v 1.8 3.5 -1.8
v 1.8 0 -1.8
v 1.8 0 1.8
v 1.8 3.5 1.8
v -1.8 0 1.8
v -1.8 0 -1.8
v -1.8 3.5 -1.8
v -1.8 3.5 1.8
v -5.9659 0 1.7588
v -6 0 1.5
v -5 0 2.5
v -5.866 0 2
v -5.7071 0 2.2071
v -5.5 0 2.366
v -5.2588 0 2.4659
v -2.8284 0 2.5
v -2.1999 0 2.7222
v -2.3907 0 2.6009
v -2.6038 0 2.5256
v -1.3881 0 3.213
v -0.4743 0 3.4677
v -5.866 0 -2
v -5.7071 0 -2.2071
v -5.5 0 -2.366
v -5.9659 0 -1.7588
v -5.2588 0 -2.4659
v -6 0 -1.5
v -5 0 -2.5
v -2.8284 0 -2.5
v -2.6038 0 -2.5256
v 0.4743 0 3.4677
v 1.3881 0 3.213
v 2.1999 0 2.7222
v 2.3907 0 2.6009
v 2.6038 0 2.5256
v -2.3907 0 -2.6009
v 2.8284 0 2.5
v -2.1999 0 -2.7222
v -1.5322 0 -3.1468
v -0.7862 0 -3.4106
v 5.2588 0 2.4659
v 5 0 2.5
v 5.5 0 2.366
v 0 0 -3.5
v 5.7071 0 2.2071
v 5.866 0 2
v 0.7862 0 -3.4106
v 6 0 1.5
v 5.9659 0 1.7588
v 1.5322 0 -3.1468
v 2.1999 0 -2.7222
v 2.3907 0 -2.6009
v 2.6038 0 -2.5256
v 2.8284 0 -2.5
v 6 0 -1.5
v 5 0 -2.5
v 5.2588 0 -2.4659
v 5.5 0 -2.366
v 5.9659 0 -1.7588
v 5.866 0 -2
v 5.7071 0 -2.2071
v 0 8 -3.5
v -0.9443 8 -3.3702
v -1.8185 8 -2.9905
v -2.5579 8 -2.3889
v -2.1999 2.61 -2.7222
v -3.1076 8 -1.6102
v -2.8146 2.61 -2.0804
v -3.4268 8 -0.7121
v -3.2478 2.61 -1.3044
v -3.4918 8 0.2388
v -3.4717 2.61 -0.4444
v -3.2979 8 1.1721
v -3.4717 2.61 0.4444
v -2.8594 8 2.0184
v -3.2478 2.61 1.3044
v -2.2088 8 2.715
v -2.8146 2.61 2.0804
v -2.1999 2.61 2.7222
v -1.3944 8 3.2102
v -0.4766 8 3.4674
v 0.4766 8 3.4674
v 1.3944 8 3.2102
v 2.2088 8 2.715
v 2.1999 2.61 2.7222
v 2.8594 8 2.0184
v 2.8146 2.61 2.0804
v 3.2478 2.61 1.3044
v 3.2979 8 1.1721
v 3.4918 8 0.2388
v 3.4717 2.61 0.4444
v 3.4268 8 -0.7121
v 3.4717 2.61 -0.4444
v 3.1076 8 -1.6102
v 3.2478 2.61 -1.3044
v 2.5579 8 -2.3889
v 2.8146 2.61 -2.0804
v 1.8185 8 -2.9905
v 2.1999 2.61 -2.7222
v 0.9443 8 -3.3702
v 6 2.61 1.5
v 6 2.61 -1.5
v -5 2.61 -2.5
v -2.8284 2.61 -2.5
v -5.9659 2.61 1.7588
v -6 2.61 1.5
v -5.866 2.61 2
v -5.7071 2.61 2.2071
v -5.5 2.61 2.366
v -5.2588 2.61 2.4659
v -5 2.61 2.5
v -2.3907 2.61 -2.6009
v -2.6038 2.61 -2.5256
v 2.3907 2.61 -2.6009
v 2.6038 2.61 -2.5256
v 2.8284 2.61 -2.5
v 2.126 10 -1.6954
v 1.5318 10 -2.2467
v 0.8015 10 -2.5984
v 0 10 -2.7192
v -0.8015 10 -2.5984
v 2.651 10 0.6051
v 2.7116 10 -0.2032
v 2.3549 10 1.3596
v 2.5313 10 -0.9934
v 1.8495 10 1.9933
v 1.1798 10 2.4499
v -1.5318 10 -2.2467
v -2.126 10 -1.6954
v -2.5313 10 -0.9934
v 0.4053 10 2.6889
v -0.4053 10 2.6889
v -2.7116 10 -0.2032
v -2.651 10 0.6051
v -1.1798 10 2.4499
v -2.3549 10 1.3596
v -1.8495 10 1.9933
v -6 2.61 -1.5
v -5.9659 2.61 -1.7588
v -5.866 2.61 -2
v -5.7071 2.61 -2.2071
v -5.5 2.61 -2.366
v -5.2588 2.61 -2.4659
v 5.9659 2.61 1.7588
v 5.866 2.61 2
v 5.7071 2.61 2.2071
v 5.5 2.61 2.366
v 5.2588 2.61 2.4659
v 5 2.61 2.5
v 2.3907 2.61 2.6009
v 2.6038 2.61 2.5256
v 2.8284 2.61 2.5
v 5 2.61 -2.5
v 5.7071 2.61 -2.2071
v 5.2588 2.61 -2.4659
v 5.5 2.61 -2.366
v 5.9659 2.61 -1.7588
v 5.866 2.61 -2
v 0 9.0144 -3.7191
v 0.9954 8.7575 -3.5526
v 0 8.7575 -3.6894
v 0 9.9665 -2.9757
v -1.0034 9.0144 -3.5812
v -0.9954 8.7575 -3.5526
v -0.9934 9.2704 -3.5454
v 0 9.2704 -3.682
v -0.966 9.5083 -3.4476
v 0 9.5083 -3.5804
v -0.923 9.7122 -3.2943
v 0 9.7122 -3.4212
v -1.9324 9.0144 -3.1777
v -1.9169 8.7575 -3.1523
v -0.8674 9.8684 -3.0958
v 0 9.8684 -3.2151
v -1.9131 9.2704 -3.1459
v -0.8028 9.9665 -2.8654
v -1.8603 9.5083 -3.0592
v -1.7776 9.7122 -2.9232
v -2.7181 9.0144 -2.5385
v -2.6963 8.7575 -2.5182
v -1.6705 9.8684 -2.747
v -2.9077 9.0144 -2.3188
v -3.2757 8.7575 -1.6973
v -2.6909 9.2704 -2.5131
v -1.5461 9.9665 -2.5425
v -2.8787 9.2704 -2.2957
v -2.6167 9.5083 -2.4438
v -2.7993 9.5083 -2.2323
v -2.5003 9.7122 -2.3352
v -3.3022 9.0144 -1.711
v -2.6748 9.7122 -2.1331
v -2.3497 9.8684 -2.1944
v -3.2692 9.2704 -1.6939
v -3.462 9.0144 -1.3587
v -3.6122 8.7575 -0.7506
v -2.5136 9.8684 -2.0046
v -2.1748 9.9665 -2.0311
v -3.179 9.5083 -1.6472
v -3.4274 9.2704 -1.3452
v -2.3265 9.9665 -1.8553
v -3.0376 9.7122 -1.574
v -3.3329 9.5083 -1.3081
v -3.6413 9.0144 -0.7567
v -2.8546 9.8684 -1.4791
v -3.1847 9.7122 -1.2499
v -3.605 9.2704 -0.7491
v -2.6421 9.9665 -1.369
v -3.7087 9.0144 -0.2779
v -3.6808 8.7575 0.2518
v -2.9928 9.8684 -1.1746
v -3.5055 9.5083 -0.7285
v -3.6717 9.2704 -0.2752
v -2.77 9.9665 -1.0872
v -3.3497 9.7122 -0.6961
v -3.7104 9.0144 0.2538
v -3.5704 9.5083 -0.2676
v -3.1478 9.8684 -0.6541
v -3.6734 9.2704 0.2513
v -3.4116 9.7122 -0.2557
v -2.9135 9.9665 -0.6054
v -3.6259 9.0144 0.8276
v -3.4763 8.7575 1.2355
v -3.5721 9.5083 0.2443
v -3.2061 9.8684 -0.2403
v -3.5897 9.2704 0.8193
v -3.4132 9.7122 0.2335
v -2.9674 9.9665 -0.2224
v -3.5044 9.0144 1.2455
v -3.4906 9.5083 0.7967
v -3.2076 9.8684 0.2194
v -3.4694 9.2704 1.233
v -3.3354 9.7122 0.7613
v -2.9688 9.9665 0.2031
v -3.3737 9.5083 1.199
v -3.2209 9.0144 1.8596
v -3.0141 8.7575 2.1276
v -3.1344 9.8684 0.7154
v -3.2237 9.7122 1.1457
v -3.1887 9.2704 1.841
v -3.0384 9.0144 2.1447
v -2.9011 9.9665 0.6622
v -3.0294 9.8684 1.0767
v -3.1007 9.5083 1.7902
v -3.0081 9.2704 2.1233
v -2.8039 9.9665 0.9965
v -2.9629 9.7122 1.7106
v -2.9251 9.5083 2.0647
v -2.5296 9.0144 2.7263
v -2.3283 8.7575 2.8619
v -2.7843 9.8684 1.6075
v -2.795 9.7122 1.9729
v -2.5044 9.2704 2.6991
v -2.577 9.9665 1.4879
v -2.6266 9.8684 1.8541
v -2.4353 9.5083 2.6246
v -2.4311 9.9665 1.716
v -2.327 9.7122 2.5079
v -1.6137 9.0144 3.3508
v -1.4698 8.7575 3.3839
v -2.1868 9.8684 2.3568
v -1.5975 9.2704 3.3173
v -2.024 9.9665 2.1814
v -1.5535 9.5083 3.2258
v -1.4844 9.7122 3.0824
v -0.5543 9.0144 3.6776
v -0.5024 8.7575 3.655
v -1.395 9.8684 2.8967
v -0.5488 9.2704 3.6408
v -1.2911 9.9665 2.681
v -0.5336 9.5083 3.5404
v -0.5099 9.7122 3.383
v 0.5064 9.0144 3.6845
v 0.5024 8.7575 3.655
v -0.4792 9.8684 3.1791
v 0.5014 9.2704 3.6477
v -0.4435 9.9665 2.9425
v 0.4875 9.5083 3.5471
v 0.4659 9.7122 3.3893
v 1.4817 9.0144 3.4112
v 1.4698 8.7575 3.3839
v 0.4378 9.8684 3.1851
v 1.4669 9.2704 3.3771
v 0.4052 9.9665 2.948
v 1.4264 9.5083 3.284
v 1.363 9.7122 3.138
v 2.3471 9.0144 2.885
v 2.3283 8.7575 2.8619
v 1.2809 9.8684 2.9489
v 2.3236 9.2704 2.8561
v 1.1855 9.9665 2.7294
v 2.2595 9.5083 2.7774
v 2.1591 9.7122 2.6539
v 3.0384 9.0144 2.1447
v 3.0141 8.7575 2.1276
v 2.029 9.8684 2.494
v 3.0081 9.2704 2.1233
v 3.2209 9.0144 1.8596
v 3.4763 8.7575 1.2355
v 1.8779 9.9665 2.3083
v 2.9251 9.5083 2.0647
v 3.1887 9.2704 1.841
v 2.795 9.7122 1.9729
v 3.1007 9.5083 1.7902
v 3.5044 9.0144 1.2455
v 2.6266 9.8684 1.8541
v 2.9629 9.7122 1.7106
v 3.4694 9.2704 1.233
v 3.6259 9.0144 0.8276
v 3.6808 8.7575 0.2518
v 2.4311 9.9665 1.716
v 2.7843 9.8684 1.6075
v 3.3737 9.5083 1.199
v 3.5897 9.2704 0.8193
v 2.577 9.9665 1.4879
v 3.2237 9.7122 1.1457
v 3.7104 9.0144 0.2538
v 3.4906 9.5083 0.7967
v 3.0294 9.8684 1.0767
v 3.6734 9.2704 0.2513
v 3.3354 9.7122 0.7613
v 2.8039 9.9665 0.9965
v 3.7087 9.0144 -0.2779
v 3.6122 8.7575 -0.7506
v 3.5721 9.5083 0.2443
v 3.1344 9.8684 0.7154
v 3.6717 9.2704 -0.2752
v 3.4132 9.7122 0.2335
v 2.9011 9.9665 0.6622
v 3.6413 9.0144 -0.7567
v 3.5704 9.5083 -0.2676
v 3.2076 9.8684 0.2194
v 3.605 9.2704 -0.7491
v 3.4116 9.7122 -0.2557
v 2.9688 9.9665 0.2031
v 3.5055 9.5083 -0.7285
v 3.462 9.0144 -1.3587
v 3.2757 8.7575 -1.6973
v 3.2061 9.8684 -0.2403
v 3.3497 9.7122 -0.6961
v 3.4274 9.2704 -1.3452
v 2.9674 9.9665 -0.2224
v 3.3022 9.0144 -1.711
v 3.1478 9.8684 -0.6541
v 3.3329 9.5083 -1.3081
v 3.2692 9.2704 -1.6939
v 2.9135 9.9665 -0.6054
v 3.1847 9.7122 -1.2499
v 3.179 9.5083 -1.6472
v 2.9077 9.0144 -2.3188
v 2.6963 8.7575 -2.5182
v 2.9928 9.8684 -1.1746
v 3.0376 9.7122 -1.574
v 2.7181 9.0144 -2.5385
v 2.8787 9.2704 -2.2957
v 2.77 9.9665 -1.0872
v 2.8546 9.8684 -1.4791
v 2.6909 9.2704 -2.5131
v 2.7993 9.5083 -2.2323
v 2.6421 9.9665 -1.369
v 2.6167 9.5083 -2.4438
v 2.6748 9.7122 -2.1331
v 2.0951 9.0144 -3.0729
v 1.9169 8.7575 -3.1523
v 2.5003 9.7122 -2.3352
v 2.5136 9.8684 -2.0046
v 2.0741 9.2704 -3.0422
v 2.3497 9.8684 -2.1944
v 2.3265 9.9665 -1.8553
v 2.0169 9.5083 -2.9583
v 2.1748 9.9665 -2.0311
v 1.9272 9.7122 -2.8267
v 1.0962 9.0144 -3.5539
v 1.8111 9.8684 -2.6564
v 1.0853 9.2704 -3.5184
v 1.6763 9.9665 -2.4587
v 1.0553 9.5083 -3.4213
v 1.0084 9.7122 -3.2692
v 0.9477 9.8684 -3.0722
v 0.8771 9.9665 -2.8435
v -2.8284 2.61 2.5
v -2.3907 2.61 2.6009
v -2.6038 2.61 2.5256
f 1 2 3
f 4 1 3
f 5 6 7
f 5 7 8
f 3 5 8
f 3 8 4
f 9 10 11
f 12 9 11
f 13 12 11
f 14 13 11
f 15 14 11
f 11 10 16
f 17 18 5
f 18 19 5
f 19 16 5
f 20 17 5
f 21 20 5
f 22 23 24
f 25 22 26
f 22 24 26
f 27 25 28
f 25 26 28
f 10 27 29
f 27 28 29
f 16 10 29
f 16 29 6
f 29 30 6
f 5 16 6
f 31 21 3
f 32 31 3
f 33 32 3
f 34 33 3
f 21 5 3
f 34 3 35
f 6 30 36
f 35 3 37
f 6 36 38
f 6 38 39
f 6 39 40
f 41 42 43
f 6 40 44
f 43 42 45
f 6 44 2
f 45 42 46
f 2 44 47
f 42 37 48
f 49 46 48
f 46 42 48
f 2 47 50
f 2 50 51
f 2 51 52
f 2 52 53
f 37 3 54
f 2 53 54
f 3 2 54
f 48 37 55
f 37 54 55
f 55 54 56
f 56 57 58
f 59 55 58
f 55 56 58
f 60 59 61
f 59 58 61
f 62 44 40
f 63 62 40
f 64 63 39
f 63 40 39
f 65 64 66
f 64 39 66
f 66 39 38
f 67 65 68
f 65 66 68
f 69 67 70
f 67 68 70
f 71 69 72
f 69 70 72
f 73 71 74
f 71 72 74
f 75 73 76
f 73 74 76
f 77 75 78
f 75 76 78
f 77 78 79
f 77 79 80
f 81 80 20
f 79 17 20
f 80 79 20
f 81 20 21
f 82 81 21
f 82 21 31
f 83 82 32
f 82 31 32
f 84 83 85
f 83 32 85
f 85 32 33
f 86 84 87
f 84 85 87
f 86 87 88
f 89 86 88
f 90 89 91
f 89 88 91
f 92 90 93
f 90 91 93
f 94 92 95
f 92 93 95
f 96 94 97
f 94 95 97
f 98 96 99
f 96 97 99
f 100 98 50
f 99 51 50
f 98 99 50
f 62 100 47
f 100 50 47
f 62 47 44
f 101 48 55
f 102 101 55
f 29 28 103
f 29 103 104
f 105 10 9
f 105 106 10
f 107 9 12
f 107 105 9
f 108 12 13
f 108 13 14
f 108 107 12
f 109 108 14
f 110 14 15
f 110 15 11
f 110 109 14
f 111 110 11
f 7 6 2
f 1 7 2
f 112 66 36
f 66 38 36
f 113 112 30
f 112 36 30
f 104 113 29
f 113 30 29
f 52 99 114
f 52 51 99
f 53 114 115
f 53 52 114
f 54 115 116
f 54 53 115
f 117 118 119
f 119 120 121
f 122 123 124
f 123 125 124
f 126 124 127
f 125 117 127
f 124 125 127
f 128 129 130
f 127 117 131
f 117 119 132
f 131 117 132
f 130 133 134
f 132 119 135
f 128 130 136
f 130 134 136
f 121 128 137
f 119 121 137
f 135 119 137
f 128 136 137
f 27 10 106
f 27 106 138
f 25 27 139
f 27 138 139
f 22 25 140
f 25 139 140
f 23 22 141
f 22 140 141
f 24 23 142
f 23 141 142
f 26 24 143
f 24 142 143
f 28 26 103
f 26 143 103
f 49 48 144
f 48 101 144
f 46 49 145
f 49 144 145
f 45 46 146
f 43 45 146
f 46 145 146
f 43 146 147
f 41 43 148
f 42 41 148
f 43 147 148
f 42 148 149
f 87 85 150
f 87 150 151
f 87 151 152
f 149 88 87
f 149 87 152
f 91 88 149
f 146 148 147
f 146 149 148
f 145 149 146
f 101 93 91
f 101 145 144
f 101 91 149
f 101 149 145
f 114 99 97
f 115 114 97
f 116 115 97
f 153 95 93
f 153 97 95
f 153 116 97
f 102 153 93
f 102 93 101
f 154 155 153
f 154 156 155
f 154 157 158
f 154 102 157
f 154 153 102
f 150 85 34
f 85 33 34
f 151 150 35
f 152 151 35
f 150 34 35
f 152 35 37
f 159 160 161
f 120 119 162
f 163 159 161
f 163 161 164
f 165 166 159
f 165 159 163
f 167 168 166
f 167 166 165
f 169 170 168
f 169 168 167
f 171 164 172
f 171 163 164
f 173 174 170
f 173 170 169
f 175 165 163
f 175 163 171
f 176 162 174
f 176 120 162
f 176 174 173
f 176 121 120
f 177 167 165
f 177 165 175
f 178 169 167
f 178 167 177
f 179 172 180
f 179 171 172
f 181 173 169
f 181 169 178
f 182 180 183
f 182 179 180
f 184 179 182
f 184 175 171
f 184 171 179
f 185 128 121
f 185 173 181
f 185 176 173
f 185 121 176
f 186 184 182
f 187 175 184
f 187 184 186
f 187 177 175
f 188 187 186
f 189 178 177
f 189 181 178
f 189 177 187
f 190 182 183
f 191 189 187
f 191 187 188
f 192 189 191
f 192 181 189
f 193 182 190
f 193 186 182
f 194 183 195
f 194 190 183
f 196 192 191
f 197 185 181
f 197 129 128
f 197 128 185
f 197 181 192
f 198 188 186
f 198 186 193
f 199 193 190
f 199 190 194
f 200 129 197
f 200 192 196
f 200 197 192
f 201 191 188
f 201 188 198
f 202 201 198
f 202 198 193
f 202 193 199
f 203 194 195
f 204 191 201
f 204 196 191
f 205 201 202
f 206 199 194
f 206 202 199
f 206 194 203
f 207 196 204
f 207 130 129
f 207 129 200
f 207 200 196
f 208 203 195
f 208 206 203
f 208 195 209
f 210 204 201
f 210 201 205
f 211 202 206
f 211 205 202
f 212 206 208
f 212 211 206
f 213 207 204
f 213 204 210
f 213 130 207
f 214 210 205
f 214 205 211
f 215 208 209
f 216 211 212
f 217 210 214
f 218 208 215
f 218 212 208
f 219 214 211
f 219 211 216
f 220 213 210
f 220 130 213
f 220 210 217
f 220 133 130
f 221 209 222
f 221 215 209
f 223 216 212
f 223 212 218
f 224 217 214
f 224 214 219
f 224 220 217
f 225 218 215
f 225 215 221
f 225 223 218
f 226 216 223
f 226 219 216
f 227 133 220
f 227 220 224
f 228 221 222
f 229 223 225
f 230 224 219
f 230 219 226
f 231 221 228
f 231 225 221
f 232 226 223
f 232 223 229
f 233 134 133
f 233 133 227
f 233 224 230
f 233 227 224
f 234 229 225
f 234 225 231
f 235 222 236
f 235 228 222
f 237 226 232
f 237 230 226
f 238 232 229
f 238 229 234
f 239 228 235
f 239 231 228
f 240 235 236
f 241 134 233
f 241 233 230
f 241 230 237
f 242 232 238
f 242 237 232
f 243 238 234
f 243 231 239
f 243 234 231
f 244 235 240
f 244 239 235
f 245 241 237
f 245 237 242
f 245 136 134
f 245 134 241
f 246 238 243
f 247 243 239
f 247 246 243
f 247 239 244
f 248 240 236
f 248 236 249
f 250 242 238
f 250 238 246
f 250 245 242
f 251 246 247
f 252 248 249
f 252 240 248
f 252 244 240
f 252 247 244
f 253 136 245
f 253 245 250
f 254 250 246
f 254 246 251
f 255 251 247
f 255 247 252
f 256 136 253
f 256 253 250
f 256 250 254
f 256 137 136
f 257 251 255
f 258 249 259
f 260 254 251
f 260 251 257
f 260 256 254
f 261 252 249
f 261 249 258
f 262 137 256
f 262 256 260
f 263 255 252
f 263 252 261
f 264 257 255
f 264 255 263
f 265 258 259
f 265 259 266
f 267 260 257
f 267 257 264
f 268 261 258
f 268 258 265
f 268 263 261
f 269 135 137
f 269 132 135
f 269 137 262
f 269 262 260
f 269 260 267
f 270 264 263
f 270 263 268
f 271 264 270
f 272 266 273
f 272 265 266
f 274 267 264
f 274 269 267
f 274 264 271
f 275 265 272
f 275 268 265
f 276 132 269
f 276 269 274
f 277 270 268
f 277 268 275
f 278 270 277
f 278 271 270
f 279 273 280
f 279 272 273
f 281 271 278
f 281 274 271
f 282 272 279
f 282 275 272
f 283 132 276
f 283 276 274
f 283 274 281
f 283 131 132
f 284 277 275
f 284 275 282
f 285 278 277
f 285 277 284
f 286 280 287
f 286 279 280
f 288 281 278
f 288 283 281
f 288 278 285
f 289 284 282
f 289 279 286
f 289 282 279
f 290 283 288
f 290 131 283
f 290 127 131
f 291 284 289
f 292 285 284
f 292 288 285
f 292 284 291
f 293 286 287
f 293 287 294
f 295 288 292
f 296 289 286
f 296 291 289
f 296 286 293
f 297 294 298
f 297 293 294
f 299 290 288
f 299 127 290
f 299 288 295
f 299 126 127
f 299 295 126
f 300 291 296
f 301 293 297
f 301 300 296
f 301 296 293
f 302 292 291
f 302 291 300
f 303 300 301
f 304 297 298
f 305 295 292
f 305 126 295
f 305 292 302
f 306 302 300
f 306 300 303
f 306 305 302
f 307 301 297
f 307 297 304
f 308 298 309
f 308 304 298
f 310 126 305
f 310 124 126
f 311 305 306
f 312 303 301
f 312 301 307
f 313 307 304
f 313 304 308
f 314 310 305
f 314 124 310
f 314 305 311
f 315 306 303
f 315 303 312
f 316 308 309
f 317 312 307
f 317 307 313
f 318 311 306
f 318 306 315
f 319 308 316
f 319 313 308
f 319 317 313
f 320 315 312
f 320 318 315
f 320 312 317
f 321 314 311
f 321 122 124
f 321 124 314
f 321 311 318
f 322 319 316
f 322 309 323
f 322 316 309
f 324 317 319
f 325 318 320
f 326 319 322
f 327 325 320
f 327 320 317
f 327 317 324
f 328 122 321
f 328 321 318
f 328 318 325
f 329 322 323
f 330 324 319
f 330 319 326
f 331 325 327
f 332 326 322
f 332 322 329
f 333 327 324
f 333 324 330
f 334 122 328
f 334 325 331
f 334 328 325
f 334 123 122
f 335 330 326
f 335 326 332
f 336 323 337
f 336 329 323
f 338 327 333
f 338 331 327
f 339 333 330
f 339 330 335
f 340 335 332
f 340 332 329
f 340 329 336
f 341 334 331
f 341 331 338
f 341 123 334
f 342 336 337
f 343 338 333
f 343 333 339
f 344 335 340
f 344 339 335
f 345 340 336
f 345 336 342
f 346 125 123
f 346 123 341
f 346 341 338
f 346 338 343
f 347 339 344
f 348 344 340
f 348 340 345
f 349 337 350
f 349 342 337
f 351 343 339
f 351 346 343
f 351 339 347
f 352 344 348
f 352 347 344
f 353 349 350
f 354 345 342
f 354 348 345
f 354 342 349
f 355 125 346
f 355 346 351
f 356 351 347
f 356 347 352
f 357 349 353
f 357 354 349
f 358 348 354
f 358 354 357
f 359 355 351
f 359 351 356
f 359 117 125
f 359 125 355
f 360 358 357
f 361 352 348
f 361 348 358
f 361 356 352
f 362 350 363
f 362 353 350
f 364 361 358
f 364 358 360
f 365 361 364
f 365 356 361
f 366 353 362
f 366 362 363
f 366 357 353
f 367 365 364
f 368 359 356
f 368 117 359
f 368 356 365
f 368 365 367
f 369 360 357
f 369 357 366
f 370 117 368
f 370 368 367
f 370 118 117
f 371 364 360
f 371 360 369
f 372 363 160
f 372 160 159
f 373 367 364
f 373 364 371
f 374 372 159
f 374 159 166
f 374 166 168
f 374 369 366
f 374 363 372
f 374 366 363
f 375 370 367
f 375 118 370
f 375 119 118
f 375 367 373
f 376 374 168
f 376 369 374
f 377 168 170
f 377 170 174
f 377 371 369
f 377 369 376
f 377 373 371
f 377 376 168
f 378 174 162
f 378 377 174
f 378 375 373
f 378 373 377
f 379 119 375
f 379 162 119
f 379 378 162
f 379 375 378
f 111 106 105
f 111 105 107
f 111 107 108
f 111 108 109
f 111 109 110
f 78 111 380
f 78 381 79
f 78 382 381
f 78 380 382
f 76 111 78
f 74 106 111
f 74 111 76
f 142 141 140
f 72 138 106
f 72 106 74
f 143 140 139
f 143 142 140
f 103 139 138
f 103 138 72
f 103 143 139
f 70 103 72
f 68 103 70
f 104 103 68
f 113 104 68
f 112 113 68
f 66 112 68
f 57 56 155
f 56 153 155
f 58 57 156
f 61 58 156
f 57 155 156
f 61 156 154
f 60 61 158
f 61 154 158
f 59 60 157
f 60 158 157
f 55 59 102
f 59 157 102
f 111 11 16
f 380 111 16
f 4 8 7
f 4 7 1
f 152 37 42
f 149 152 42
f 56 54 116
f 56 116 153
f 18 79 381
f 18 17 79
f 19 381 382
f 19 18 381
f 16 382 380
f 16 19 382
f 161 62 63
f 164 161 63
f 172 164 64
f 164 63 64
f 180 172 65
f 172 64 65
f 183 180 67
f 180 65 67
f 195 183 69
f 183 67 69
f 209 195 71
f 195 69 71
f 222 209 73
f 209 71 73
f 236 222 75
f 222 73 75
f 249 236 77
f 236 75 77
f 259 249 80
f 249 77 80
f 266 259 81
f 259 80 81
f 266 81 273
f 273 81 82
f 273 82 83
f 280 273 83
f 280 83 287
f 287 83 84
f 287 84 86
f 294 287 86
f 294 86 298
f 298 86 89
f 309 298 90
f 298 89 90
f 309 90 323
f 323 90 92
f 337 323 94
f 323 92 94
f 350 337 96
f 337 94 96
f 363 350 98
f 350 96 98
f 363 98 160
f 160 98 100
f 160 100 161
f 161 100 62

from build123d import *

# Parameters (mm, degrees)
SKETCH3_W           = 3.6
SKETCH3_H           = 3.6
CUT_EXTRUDE2_DEPTH  = 3.5
SKETCH4_W           = 4.2
SKETCH4_H           = 5
BOSS_EXTRUDE1_DEPTH = 2.61
FILLET1_R           = 1


with BuildPart() as part:
    # Sketch1 → Revolve1 (revolve)
    with BuildSketch(Plane.XY, mode=Mode.PRIVATE) as revolve1_sk:
        Polygon((0, 0), (0, 10), (4, 10), (3.5, 8), (3.5, 0), align=None)
    revolve(revolve1_sk.sketch.rotate(Axis((0, 0, 0), (0, 1, 0)), 90), axis=Axis((0, 0, 0), (0, 1, 0)))

    # Sketch3 → Cut-Extrude2 (cut)
    with BuildSketch(Plane.XZ):
        Rectangle(SKETCH3_W, SKETCH3_H)
    extrude(amount=-CUT_EXTRUDE2_DEPTH, mode=Mode.SUBTRACT)

    # Sketch4 → Boss-Extrude1 (add)
    with BuildSketch(Plane(origin=(0, 0, 0), x_dir=(1, 0, 0), z_dir=(0, 1, 0))):
        with Locations((-3.9, 0)):
            Rectangle(SKETCH4_W, SKETCH4_H)
        with Locations((3.9, 0)):
            Rectangle(SKETCH4_W, SKETCH4_H)
    extrude(amount=BOSS_EXTRUDE1_DEPTH)

    # Fillet1
    fillet1_edges = [part.edges().sort_by_distance(p)[0] for p in [
        (-2.449489743, 1.305, -2.5),
        (-2.449489743, 1.305, 2.5),
        (-6, 1.305, -2.5),
        (-6, 1.305, 2.5),
        (0, 10, 4),
        (2.449489743, 1.305, 2.5),
        (2.449489743, 1.305, -2.5),
        (6, 1.305, 2.5),
        (6, 1.305, -2.5),
    ]]
    fillet(fillet1_edges, radius=FILLET1_R)


solid = part.part
